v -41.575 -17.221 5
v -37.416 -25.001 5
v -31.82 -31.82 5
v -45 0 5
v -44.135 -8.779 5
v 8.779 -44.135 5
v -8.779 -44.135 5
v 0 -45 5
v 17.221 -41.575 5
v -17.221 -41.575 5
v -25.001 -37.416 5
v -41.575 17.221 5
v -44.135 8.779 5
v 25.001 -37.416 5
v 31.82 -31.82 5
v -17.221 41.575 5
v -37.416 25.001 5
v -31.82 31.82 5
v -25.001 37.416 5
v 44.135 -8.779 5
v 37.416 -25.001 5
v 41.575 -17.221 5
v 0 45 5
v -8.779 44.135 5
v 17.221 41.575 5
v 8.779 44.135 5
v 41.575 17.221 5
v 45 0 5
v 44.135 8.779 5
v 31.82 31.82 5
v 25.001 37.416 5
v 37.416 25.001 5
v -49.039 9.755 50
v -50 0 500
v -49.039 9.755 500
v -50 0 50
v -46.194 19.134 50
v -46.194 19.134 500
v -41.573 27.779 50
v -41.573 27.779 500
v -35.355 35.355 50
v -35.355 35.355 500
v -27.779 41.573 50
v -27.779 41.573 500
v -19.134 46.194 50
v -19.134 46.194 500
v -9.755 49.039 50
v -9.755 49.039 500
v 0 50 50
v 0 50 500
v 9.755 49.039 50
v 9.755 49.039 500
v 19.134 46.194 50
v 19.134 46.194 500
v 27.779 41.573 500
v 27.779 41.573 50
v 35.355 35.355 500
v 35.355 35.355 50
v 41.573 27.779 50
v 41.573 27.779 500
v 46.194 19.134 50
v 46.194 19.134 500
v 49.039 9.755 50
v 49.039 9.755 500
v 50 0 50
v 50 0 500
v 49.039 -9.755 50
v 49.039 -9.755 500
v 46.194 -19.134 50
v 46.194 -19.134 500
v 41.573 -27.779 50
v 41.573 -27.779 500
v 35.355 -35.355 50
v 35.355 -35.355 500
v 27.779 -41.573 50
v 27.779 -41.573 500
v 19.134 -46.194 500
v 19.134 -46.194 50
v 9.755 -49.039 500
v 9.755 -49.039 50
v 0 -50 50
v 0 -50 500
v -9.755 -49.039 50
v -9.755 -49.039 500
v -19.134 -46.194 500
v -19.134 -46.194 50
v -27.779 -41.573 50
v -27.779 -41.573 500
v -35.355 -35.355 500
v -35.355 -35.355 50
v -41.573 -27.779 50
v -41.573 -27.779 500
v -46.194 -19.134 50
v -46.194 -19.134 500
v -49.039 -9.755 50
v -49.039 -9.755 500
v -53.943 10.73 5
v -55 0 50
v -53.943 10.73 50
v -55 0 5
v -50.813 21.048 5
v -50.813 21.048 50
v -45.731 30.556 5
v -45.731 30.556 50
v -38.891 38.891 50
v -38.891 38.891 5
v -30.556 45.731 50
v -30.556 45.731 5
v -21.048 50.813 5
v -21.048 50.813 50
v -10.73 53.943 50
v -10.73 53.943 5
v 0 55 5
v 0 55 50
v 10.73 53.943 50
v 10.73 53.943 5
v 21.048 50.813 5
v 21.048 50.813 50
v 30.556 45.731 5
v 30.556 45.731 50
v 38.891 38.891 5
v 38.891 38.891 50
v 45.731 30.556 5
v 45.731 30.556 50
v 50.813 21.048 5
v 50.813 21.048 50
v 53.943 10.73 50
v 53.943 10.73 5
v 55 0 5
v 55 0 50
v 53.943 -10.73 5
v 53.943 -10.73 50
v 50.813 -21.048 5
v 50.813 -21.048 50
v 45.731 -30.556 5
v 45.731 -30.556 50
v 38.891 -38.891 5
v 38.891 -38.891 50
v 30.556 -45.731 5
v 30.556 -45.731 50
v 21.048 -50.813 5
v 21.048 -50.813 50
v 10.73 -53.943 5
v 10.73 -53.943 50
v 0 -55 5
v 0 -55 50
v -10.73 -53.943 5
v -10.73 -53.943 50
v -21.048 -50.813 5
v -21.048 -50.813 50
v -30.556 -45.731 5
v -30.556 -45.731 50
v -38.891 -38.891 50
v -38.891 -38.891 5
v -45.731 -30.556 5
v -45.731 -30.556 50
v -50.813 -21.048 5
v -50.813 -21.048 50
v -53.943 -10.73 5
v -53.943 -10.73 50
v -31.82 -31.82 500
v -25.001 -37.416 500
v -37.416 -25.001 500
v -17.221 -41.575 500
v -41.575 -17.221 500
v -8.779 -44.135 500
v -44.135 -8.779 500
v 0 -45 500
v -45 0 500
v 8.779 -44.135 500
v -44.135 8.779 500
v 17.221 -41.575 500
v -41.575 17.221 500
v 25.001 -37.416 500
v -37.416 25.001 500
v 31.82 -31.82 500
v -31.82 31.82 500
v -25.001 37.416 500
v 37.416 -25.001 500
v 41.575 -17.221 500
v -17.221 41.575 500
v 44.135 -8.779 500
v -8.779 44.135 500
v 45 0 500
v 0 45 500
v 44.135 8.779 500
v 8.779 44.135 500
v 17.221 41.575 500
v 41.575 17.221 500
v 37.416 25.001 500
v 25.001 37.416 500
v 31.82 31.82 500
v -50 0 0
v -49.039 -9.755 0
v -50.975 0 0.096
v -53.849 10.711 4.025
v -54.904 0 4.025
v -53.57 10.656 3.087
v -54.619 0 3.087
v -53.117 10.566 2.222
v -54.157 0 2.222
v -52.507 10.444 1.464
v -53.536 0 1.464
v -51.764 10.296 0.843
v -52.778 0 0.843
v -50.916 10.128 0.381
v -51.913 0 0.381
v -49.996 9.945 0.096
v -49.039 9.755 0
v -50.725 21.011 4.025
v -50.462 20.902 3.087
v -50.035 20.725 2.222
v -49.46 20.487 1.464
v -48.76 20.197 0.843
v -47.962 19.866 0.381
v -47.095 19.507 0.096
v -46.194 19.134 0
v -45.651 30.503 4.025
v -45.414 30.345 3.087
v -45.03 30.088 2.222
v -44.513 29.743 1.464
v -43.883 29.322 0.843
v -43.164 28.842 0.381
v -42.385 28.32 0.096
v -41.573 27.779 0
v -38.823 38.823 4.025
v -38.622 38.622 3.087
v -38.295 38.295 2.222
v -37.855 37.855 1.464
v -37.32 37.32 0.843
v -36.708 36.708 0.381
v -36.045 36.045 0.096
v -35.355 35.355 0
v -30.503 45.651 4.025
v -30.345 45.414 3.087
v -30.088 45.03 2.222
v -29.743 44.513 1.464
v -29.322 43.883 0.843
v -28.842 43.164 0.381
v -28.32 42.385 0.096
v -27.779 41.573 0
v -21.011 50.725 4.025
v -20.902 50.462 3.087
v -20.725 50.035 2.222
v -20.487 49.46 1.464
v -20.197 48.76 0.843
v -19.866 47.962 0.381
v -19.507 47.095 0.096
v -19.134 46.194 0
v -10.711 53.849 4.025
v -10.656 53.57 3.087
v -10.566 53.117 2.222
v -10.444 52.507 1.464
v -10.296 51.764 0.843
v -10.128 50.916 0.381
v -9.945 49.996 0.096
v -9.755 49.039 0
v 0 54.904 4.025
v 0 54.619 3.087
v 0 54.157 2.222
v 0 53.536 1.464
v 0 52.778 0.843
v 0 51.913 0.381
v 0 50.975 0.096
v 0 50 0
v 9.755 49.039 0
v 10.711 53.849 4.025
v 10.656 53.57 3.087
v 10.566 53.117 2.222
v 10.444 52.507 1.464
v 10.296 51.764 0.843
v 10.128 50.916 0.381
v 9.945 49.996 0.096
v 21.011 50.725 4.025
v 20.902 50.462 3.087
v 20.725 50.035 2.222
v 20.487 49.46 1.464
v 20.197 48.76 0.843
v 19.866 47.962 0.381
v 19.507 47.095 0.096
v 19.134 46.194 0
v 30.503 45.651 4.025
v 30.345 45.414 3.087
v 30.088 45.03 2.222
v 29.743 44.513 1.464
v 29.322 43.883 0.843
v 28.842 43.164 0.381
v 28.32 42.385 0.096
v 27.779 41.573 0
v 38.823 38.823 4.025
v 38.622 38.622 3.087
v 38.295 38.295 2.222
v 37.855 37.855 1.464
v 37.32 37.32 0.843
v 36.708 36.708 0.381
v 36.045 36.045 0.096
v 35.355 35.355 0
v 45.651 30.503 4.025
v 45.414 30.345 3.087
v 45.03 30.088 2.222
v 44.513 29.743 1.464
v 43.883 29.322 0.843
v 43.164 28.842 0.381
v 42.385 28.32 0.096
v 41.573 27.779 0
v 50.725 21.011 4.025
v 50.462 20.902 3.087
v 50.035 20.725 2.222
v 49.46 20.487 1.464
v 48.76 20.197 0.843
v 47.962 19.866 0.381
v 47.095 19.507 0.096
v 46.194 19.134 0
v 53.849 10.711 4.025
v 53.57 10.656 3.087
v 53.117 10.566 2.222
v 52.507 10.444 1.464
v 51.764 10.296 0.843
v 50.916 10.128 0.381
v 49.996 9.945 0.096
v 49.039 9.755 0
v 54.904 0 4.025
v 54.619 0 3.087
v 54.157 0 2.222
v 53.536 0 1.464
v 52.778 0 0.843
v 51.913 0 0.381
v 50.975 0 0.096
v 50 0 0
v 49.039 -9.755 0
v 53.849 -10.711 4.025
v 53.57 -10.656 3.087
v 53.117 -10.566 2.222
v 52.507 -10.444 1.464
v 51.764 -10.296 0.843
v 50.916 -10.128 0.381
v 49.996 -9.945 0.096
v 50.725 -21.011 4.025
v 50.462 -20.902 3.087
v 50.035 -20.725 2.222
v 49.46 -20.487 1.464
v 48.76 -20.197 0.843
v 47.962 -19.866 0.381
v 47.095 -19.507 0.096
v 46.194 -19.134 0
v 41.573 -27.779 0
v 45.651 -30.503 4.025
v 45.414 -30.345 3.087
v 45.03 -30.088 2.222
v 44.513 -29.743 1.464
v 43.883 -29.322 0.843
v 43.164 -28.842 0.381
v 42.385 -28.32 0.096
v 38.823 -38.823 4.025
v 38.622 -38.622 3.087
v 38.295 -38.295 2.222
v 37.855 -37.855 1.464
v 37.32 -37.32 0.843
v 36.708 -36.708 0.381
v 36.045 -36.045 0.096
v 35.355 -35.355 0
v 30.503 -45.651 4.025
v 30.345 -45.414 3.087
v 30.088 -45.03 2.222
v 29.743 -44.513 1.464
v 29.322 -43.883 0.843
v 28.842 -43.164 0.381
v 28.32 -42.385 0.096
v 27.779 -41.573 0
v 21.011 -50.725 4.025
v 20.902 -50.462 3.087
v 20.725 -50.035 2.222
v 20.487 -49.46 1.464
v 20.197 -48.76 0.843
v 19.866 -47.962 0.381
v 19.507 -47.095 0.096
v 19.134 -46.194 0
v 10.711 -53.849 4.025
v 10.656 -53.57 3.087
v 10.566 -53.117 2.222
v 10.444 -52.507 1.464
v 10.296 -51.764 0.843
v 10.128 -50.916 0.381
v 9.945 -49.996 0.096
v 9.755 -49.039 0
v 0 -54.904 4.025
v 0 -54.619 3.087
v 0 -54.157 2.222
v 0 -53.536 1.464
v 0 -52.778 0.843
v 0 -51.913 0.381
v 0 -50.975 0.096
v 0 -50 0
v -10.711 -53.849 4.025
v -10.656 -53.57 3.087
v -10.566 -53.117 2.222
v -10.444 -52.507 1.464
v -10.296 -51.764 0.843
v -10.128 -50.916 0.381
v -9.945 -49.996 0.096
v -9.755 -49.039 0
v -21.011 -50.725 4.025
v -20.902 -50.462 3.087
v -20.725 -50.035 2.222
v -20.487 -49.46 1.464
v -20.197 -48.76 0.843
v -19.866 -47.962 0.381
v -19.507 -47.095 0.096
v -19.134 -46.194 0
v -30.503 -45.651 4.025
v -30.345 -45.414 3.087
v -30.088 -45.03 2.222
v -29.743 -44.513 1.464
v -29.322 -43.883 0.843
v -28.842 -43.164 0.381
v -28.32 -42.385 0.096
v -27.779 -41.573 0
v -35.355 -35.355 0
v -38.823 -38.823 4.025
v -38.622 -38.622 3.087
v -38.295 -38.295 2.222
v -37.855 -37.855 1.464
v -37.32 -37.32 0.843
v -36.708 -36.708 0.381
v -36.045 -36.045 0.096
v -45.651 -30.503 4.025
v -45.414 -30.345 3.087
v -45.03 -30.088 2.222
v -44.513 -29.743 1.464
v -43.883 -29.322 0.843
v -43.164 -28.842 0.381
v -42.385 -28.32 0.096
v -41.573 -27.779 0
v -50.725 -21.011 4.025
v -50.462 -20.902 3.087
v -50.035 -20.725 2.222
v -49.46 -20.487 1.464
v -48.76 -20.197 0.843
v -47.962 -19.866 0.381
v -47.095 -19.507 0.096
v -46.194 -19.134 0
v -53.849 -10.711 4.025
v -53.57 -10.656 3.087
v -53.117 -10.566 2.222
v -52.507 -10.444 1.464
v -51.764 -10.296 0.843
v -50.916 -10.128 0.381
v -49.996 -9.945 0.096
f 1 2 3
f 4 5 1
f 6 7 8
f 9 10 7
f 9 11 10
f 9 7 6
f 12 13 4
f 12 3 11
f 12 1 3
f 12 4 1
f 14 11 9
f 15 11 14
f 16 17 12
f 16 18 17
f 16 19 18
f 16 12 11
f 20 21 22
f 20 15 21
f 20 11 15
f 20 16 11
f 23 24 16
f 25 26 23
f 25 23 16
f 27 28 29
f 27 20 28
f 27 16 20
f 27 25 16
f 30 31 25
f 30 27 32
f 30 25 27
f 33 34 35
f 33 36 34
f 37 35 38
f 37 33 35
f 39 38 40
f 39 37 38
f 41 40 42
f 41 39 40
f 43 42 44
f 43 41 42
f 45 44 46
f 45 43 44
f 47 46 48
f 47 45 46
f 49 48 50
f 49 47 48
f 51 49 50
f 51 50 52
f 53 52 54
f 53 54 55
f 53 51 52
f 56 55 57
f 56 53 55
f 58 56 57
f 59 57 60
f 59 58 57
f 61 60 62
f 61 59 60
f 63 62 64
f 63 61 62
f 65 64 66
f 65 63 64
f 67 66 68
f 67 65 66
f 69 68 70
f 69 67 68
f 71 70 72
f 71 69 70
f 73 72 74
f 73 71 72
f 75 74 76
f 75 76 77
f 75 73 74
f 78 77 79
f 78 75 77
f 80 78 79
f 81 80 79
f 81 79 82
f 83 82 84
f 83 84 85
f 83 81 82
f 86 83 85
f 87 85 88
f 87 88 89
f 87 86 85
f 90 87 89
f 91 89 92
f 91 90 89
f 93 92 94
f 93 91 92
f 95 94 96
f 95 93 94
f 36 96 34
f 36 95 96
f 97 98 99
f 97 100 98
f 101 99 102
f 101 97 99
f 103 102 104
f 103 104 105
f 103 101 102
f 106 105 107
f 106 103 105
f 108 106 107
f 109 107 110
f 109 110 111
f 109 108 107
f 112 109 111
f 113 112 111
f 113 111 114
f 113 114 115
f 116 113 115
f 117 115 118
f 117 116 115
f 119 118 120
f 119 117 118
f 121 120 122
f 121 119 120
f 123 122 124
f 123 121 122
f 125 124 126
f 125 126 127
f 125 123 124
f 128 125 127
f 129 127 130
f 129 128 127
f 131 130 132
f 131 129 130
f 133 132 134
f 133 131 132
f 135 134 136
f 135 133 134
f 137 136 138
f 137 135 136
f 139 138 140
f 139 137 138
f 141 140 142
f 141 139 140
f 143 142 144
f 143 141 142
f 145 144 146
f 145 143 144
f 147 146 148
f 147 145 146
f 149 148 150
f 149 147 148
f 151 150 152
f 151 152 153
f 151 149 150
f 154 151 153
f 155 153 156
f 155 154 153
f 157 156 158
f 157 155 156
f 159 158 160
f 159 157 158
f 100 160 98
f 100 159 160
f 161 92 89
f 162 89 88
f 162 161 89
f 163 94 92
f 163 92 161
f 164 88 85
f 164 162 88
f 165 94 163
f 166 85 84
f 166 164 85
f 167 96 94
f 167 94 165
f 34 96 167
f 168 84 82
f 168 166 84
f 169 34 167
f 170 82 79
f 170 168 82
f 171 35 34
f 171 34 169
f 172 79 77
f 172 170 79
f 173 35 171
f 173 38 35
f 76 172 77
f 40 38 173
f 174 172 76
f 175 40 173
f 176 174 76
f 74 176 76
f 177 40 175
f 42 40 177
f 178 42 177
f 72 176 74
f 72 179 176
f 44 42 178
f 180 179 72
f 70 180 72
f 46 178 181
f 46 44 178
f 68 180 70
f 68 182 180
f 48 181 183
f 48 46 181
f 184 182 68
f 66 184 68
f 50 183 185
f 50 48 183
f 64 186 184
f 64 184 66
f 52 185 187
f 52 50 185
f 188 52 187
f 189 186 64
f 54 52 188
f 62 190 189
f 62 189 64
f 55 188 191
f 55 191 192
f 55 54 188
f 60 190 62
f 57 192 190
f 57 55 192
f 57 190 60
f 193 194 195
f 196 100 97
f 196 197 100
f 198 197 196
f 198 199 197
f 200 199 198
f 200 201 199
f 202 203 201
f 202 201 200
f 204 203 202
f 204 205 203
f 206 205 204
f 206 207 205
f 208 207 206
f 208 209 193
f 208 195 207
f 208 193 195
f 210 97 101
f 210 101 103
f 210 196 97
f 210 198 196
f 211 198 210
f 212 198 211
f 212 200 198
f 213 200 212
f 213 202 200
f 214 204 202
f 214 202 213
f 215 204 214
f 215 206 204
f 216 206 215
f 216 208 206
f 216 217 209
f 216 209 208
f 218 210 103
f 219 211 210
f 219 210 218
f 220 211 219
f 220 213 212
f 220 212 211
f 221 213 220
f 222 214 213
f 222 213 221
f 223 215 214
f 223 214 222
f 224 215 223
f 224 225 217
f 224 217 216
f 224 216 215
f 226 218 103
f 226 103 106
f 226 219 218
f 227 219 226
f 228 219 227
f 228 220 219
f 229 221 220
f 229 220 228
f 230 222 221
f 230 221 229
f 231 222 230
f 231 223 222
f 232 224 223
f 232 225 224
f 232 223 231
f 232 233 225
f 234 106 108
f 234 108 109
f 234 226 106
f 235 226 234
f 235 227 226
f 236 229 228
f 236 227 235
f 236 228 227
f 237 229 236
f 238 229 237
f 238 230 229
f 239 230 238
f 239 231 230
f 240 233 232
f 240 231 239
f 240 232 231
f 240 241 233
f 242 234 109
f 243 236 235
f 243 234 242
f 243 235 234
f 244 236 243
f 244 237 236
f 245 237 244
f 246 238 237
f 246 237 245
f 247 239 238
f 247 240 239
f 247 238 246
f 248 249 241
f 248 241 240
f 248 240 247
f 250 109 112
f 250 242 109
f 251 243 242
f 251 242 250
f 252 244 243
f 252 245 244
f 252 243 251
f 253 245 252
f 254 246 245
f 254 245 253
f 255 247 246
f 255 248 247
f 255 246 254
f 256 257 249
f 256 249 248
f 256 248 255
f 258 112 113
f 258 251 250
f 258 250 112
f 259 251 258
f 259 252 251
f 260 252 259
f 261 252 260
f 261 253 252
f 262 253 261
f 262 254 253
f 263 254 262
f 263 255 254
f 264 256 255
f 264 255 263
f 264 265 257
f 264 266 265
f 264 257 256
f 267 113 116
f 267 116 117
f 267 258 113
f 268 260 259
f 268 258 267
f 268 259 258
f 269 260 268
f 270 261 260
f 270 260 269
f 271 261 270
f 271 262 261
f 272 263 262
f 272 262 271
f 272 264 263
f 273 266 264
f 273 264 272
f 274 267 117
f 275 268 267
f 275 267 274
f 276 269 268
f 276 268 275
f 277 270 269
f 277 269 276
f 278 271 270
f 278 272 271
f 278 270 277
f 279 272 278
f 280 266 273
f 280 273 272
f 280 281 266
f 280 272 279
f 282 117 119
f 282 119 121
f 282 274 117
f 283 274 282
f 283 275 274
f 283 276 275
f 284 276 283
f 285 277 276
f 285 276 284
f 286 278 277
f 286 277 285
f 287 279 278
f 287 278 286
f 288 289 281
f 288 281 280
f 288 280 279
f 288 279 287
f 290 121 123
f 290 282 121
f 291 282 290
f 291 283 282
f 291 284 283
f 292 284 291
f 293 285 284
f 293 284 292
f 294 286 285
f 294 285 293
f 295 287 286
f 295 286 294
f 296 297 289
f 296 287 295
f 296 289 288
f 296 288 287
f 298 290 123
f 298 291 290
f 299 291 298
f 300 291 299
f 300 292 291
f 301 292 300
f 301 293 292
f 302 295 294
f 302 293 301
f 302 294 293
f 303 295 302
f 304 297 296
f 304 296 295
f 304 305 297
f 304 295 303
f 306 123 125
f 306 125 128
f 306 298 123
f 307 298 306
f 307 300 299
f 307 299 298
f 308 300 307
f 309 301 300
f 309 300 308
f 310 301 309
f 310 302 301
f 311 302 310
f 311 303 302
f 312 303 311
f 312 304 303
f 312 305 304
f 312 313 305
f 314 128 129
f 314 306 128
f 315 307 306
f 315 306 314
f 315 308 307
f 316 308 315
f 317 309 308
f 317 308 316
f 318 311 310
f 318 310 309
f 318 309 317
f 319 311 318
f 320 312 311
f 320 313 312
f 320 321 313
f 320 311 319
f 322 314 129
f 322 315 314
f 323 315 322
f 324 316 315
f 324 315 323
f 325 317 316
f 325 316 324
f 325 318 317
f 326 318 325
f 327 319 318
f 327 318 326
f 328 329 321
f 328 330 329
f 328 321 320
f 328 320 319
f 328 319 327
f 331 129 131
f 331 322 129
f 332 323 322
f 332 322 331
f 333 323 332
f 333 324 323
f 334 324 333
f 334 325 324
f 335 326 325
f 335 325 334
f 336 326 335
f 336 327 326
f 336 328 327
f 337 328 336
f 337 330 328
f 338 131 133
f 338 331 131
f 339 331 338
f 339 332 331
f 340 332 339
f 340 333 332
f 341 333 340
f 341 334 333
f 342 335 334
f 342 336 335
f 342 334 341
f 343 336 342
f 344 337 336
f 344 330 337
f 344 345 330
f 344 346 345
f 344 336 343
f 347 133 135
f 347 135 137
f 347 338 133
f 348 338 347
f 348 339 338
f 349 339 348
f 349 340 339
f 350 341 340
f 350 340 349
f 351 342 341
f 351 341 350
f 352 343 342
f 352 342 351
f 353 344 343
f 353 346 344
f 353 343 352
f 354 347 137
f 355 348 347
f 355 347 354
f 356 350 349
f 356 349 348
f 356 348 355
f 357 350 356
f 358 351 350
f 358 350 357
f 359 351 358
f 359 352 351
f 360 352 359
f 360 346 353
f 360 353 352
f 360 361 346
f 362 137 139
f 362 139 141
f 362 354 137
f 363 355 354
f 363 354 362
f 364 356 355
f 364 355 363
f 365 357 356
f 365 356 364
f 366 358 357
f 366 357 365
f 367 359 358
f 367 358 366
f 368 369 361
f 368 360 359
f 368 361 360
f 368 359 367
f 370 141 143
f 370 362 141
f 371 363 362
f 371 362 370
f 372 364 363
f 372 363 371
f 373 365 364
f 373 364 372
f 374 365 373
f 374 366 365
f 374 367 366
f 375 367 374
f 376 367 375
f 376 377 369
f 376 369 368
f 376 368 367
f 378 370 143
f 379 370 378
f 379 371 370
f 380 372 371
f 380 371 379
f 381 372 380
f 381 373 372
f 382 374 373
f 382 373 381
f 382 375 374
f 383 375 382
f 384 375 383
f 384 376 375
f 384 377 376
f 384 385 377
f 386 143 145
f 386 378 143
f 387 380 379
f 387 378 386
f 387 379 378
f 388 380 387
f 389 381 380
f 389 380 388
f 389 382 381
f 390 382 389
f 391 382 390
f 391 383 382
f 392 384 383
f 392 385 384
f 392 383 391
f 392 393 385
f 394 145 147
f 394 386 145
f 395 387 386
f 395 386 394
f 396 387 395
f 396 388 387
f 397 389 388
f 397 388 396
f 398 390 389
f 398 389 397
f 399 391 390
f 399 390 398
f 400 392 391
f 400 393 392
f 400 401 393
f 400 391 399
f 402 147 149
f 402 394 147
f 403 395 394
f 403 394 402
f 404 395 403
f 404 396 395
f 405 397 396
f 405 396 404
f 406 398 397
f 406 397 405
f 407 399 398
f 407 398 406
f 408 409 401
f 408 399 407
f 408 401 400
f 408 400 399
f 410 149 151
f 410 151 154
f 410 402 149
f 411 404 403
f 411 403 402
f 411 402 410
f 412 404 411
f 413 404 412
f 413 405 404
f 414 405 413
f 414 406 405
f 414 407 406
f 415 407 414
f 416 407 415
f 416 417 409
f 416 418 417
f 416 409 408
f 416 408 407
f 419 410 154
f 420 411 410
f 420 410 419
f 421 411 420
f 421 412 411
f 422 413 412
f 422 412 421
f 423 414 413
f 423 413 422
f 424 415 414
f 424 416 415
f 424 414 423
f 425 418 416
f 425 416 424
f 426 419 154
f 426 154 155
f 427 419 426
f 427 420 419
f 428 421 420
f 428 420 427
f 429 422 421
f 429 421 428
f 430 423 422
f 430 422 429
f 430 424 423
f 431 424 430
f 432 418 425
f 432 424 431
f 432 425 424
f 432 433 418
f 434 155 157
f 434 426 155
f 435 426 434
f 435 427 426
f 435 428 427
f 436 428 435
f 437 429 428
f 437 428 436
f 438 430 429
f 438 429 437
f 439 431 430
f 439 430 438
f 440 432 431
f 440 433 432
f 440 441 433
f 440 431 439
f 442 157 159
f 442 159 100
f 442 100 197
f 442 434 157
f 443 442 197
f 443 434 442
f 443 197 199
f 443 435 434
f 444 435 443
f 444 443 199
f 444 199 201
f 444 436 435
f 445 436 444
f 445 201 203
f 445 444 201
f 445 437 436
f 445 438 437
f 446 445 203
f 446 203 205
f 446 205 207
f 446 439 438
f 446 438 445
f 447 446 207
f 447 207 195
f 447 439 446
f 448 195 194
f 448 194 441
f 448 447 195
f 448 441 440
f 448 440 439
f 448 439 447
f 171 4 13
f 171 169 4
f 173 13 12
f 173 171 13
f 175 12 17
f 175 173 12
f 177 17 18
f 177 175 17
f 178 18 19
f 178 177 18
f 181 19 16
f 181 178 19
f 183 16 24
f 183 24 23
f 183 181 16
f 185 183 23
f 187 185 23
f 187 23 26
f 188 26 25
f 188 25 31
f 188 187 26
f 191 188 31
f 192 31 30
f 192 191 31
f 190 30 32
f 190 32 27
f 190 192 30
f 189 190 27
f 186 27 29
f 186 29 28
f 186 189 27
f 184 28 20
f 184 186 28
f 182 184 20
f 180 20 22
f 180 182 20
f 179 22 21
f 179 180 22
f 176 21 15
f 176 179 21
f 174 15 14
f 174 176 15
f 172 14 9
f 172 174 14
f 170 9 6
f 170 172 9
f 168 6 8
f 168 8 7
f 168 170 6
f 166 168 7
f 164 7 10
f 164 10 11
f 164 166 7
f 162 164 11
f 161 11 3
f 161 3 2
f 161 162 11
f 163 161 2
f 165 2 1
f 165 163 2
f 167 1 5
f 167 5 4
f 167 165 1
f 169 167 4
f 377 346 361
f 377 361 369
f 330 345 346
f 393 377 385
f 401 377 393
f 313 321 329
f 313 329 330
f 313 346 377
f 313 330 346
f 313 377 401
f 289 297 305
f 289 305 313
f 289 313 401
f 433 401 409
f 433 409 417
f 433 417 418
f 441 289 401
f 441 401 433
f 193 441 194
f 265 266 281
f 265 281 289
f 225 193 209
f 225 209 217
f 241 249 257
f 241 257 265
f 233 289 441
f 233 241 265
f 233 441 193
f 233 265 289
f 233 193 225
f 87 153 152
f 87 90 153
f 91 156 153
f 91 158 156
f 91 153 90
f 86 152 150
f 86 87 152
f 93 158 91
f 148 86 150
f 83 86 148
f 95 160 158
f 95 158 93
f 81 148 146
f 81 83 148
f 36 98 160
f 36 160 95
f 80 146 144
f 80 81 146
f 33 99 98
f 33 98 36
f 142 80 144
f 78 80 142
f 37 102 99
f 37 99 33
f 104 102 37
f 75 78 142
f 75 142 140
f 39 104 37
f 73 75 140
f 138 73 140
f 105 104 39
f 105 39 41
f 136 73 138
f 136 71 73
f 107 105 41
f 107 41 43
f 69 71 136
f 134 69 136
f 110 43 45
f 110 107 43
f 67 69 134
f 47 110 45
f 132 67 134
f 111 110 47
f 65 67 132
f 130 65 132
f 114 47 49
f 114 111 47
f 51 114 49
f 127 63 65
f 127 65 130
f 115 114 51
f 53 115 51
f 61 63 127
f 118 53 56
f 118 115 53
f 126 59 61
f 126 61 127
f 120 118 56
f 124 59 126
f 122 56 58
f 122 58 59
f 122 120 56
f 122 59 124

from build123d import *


with BuildPart() as f1:
    # F0 (on Front) → F1 (revolve)
    with BuildSketch(Plane.XZ):
        with BuildLine():
            ThreePointArc((-55, 5), (-53.535534, 1.464466), (-50, 0))
            Line((-50, 0), (-50, 50))
            Line((-50, 50), (-55, 50))
            Line((-55, 50), (-55, 5))
        make_face()
        Polygon((-50, 0), (0, 0), (0, 5), (-45, 5), (-45, 500), (-50, 500), (-50, 50), align=None)
    revolve(axis=Axis((0, 0, 252.5), (0, 0, -1)))


solid = f1.part
